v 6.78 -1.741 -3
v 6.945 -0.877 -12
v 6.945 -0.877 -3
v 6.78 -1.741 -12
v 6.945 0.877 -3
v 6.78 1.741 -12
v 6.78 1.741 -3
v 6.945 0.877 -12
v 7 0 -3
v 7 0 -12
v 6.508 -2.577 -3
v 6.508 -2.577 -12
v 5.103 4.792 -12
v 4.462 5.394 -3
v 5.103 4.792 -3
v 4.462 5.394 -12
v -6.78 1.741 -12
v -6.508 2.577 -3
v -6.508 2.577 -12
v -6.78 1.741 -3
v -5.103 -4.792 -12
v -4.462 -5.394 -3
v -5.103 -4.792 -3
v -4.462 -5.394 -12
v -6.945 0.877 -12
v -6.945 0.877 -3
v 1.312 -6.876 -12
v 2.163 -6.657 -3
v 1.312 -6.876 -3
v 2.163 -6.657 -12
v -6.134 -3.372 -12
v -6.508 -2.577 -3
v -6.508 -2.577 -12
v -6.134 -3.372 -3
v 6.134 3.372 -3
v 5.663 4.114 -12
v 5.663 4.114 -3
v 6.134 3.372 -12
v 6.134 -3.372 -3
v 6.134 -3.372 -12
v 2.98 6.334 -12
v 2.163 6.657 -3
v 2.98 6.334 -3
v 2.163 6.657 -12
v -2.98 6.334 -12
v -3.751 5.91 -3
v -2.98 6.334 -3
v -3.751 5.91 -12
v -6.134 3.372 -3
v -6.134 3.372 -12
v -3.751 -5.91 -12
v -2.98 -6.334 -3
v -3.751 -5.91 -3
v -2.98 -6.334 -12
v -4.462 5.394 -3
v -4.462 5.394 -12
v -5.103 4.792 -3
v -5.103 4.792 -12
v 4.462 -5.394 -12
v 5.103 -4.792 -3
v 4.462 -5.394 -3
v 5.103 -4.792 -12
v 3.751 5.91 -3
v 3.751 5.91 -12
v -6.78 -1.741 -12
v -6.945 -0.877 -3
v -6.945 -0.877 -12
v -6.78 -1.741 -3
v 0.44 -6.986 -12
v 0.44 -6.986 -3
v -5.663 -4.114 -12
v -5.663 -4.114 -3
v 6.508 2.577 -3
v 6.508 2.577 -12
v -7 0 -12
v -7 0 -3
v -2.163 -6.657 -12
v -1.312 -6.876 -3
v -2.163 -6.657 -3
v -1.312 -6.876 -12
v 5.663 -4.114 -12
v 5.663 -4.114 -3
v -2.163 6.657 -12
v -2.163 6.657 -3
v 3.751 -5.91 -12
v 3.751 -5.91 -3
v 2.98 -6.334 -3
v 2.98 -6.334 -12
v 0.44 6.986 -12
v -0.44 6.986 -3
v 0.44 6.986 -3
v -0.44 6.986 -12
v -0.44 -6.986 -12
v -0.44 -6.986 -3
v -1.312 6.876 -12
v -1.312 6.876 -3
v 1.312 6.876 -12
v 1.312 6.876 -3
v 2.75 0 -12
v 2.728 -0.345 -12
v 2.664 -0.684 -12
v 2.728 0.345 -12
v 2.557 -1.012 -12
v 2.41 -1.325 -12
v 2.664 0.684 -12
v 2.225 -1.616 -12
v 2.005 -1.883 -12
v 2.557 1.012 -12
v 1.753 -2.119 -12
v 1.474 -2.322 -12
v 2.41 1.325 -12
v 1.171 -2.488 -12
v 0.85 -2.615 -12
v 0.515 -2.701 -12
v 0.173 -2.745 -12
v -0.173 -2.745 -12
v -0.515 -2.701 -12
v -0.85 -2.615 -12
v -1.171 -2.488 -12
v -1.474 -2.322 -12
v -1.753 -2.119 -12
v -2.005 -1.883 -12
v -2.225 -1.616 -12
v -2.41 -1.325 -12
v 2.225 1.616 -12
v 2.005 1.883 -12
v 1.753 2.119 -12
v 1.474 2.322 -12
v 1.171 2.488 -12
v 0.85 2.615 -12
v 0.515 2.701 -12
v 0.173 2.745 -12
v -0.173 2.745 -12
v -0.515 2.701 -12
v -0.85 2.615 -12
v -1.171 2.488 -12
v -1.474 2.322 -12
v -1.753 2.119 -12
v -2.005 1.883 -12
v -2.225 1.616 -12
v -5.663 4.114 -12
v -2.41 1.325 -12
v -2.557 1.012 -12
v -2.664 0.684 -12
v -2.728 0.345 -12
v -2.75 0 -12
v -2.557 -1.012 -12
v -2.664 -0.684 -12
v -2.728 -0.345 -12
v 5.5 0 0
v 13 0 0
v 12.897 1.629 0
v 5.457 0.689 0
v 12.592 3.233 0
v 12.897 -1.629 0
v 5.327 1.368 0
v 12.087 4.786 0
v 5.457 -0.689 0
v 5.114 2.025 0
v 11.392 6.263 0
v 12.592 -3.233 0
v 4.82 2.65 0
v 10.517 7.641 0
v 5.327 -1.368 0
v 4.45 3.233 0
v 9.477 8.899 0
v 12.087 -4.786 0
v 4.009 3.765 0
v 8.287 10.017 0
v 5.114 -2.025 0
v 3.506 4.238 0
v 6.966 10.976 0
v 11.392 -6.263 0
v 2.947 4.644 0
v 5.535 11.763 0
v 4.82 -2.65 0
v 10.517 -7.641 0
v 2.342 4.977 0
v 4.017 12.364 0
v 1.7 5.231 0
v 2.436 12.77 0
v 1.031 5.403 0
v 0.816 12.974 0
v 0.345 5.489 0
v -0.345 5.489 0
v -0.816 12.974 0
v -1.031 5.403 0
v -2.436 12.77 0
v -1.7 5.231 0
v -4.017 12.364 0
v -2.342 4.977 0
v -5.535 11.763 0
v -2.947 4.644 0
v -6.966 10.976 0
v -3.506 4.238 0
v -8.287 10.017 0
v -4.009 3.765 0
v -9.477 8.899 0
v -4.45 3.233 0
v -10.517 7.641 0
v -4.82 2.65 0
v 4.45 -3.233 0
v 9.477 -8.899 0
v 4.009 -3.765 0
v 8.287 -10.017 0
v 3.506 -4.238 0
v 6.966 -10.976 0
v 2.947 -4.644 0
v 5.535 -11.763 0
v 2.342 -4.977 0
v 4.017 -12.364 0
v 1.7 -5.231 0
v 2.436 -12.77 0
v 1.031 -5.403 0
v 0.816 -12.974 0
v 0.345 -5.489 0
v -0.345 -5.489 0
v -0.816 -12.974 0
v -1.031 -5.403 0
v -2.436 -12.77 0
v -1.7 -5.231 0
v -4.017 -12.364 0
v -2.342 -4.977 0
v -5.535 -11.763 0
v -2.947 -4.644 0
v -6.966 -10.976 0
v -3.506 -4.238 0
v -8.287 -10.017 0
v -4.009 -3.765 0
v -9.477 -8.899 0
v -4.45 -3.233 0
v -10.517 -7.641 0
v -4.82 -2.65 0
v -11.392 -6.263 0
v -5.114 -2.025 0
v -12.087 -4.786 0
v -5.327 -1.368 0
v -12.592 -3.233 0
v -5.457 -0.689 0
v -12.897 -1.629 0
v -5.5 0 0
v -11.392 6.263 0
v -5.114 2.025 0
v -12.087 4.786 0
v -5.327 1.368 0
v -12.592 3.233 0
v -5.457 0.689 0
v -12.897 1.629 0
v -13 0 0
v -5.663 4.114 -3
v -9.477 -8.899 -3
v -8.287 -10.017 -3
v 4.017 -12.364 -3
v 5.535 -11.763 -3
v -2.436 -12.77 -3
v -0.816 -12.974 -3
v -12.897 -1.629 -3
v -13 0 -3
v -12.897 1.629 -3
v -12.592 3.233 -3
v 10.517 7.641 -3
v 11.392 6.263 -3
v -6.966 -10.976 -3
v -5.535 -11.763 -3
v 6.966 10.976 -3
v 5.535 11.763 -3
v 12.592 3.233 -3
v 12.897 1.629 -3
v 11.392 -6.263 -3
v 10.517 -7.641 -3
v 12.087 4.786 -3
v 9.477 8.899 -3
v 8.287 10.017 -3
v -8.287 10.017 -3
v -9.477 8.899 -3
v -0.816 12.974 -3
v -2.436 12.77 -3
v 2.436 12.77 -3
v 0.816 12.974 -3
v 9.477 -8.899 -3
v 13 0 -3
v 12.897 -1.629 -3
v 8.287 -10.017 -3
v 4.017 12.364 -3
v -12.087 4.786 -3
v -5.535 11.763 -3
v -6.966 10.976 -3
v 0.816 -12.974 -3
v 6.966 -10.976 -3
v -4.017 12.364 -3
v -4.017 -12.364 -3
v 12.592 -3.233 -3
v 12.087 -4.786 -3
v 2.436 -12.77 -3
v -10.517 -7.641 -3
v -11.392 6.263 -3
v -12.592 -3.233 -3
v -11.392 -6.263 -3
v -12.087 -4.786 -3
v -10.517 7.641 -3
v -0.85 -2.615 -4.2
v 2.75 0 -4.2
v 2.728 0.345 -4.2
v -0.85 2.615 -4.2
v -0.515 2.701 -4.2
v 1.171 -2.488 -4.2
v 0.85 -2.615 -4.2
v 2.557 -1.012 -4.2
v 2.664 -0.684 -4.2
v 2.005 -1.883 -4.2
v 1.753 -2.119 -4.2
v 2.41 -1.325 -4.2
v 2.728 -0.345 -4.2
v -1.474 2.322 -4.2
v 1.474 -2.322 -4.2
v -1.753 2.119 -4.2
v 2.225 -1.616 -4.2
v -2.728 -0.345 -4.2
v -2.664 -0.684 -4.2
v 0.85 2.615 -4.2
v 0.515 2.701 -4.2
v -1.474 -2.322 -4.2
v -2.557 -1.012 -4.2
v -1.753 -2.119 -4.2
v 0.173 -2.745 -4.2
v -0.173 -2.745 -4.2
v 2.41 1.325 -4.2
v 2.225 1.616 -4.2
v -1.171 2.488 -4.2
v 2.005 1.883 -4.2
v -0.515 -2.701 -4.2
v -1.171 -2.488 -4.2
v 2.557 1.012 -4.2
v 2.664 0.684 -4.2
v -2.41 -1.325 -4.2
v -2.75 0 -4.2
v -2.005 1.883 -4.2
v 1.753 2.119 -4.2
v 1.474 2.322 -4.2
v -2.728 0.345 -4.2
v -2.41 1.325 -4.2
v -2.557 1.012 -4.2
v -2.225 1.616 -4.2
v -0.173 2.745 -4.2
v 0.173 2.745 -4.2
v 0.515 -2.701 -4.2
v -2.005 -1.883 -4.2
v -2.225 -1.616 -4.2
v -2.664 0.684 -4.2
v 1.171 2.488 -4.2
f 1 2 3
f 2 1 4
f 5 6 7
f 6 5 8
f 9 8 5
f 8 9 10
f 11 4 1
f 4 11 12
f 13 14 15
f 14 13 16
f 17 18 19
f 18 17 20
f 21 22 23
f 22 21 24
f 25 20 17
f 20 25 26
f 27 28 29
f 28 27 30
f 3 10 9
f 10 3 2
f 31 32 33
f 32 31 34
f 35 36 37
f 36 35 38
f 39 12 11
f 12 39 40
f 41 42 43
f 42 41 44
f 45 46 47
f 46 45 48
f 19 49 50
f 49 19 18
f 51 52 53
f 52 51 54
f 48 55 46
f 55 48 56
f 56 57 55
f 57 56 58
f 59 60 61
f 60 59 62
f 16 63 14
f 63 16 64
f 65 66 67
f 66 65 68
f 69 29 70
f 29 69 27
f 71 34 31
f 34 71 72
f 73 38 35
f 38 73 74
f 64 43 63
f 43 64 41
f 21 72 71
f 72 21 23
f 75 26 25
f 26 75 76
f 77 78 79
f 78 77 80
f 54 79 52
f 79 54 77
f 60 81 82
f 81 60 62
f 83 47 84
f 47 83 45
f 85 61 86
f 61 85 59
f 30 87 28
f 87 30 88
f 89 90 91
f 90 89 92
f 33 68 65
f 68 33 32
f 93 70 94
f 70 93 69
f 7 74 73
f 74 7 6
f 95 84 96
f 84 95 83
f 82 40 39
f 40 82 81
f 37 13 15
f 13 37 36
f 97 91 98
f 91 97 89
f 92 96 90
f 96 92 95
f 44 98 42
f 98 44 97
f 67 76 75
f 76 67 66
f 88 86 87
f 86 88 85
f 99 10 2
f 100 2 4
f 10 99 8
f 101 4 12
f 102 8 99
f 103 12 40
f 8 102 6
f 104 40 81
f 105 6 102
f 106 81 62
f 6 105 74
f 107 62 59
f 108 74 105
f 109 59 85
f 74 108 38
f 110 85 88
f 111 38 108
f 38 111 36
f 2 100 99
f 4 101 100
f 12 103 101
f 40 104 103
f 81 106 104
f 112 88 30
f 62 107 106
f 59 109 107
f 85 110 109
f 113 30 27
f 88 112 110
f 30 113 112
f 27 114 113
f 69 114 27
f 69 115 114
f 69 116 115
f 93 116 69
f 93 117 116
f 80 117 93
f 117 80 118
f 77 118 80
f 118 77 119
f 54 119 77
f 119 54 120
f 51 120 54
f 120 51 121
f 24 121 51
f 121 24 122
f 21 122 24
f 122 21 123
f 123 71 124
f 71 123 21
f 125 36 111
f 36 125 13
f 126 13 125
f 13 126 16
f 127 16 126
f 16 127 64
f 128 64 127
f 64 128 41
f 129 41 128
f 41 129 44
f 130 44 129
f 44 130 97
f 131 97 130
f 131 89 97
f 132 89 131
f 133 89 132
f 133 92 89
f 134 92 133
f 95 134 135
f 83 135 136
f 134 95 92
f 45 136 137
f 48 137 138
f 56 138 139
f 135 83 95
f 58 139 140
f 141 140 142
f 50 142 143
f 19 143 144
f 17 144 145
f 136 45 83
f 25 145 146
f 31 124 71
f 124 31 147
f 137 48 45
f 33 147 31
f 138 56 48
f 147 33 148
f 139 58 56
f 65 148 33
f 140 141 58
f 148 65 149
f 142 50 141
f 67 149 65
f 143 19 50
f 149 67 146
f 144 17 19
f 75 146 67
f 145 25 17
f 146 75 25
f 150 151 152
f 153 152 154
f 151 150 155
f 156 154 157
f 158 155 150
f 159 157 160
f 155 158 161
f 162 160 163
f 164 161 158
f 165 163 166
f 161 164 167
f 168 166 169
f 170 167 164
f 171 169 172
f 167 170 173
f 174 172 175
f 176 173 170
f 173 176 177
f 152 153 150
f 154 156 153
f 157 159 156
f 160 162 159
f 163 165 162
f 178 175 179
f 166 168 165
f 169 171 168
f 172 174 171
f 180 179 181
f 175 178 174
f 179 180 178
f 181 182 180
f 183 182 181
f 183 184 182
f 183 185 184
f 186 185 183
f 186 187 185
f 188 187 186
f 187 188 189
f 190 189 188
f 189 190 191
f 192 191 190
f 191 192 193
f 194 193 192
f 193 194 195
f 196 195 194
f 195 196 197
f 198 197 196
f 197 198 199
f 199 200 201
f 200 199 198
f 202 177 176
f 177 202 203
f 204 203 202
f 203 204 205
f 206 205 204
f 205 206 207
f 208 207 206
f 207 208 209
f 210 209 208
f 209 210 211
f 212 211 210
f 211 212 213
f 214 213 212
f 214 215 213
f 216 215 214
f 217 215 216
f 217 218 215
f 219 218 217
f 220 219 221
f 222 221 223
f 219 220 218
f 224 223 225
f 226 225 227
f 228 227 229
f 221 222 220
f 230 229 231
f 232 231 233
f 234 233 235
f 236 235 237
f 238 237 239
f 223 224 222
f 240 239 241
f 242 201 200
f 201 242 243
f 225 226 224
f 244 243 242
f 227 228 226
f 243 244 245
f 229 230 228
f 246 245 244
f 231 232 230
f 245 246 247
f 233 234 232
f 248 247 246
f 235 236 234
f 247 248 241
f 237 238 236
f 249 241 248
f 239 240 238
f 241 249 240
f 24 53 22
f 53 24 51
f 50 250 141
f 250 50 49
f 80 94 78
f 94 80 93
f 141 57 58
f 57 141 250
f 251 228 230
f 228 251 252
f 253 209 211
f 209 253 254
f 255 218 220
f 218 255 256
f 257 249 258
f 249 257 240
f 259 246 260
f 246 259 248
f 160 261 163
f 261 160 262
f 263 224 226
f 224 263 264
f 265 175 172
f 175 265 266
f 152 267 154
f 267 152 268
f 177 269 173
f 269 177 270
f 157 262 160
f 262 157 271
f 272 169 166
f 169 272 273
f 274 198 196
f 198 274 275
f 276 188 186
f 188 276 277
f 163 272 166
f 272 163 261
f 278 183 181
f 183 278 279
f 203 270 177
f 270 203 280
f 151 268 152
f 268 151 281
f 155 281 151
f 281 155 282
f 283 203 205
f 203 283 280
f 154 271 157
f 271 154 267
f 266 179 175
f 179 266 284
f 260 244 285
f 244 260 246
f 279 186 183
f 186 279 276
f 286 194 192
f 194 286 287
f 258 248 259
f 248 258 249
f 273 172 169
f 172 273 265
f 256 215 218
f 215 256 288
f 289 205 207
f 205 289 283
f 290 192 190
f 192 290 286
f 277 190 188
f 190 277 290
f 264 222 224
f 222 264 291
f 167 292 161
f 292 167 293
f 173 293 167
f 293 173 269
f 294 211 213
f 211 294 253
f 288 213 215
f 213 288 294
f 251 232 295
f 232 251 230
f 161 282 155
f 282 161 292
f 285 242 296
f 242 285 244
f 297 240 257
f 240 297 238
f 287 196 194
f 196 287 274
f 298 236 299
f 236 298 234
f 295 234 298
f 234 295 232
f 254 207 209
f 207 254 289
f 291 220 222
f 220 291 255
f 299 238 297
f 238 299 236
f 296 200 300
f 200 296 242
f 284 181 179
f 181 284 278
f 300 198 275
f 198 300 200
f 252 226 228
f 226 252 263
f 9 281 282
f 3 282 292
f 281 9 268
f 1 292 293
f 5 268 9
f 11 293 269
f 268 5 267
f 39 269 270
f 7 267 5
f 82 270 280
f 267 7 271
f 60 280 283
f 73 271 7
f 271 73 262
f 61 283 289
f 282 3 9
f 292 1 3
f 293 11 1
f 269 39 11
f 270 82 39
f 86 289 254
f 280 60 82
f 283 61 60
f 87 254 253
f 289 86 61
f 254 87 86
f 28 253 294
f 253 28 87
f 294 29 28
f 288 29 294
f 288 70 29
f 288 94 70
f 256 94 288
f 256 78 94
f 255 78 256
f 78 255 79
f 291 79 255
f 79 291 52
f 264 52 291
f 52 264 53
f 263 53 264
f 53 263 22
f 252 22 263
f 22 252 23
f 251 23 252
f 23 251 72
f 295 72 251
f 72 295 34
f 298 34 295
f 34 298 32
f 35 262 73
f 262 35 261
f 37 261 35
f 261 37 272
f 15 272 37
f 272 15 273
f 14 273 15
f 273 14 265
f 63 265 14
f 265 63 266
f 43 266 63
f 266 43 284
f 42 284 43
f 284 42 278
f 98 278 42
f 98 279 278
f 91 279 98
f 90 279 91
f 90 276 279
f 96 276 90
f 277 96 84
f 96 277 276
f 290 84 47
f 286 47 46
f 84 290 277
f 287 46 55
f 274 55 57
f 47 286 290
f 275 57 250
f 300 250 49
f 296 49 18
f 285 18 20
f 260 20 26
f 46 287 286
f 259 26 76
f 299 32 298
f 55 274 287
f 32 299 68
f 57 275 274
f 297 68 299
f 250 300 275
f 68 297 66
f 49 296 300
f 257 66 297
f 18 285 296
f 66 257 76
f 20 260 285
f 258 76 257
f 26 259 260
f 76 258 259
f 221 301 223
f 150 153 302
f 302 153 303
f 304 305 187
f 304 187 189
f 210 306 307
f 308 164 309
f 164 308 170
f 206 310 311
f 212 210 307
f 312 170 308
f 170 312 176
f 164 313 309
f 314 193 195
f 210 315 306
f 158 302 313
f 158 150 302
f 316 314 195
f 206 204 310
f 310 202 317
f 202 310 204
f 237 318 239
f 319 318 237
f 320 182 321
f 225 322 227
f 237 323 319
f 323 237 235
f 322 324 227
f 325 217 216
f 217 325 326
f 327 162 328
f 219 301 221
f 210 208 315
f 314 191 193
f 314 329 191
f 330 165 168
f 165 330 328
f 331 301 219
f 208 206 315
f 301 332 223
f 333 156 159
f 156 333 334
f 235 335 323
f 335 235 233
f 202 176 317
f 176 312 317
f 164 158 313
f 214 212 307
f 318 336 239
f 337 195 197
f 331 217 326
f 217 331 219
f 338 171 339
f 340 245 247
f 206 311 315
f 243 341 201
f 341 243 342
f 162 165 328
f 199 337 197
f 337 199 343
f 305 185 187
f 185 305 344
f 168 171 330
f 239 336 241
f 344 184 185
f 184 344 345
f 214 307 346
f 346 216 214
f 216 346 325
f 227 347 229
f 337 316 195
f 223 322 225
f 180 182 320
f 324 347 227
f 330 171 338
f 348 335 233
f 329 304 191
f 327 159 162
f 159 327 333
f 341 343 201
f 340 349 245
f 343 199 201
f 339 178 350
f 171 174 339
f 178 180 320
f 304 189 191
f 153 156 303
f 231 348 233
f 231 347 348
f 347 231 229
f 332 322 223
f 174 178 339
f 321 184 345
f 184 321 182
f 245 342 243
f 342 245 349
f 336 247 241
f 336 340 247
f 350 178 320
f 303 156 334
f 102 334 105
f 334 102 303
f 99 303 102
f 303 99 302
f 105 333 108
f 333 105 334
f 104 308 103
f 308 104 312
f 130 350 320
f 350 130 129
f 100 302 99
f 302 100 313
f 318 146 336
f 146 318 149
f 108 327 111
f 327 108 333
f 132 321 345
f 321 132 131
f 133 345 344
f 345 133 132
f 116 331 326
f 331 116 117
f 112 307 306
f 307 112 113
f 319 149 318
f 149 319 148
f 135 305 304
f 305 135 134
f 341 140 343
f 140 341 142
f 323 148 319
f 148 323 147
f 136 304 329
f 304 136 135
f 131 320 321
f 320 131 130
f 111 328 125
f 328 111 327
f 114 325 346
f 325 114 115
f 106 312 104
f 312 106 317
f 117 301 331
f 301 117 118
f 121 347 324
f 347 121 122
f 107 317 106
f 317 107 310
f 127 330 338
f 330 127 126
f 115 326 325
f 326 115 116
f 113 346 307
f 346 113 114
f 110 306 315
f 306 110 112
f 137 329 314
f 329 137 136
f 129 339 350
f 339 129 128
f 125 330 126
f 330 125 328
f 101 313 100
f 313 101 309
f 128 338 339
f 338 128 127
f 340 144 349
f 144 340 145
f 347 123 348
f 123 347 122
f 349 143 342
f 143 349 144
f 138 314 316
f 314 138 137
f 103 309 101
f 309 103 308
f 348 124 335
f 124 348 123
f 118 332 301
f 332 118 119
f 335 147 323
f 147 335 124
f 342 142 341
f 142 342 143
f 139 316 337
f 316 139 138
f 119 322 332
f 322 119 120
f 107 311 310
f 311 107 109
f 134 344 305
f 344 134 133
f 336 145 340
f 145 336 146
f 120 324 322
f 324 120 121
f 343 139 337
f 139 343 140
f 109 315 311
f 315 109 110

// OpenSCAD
$fn = 50;


difference() {
	union() {
		translate(v = [0, 0, -12.0000000000]) {
			cylinder(h = 12, r = 7.0000000000);
		}
		translate(v = [0, 0, -3.0000000000]) {
			cylinder(h = 3, r = 13.0000000000);
		}
	}
	union() {
		translate(v = [0, 0, 0]) {
			rotate(a = [0, 0, 0]) {
				difference() {
					union() {
						#translate(v = [0, 0, -12.0000000000]) {
							cylinder(h = 12, r = 2.2500000000);
						}
						#translate(v = [0, 0, -4.2000000000]) {
							cylinder(h = 4.2000000000, r = 7.0000000000, r1 = 2.7500000000, r2 = 5.5000000000);
						}
						#translate(v = [0, 0, -12.0000000000]) {
							cylinder(h = 12, r = 2.7500000000);
						}
						#translate(v = [0, 0, -12.0000000000]) {
							cylinder(h = 12, r = 2.2500000000);
						}
					}
					union();
				}
			}
		}
	}
}
